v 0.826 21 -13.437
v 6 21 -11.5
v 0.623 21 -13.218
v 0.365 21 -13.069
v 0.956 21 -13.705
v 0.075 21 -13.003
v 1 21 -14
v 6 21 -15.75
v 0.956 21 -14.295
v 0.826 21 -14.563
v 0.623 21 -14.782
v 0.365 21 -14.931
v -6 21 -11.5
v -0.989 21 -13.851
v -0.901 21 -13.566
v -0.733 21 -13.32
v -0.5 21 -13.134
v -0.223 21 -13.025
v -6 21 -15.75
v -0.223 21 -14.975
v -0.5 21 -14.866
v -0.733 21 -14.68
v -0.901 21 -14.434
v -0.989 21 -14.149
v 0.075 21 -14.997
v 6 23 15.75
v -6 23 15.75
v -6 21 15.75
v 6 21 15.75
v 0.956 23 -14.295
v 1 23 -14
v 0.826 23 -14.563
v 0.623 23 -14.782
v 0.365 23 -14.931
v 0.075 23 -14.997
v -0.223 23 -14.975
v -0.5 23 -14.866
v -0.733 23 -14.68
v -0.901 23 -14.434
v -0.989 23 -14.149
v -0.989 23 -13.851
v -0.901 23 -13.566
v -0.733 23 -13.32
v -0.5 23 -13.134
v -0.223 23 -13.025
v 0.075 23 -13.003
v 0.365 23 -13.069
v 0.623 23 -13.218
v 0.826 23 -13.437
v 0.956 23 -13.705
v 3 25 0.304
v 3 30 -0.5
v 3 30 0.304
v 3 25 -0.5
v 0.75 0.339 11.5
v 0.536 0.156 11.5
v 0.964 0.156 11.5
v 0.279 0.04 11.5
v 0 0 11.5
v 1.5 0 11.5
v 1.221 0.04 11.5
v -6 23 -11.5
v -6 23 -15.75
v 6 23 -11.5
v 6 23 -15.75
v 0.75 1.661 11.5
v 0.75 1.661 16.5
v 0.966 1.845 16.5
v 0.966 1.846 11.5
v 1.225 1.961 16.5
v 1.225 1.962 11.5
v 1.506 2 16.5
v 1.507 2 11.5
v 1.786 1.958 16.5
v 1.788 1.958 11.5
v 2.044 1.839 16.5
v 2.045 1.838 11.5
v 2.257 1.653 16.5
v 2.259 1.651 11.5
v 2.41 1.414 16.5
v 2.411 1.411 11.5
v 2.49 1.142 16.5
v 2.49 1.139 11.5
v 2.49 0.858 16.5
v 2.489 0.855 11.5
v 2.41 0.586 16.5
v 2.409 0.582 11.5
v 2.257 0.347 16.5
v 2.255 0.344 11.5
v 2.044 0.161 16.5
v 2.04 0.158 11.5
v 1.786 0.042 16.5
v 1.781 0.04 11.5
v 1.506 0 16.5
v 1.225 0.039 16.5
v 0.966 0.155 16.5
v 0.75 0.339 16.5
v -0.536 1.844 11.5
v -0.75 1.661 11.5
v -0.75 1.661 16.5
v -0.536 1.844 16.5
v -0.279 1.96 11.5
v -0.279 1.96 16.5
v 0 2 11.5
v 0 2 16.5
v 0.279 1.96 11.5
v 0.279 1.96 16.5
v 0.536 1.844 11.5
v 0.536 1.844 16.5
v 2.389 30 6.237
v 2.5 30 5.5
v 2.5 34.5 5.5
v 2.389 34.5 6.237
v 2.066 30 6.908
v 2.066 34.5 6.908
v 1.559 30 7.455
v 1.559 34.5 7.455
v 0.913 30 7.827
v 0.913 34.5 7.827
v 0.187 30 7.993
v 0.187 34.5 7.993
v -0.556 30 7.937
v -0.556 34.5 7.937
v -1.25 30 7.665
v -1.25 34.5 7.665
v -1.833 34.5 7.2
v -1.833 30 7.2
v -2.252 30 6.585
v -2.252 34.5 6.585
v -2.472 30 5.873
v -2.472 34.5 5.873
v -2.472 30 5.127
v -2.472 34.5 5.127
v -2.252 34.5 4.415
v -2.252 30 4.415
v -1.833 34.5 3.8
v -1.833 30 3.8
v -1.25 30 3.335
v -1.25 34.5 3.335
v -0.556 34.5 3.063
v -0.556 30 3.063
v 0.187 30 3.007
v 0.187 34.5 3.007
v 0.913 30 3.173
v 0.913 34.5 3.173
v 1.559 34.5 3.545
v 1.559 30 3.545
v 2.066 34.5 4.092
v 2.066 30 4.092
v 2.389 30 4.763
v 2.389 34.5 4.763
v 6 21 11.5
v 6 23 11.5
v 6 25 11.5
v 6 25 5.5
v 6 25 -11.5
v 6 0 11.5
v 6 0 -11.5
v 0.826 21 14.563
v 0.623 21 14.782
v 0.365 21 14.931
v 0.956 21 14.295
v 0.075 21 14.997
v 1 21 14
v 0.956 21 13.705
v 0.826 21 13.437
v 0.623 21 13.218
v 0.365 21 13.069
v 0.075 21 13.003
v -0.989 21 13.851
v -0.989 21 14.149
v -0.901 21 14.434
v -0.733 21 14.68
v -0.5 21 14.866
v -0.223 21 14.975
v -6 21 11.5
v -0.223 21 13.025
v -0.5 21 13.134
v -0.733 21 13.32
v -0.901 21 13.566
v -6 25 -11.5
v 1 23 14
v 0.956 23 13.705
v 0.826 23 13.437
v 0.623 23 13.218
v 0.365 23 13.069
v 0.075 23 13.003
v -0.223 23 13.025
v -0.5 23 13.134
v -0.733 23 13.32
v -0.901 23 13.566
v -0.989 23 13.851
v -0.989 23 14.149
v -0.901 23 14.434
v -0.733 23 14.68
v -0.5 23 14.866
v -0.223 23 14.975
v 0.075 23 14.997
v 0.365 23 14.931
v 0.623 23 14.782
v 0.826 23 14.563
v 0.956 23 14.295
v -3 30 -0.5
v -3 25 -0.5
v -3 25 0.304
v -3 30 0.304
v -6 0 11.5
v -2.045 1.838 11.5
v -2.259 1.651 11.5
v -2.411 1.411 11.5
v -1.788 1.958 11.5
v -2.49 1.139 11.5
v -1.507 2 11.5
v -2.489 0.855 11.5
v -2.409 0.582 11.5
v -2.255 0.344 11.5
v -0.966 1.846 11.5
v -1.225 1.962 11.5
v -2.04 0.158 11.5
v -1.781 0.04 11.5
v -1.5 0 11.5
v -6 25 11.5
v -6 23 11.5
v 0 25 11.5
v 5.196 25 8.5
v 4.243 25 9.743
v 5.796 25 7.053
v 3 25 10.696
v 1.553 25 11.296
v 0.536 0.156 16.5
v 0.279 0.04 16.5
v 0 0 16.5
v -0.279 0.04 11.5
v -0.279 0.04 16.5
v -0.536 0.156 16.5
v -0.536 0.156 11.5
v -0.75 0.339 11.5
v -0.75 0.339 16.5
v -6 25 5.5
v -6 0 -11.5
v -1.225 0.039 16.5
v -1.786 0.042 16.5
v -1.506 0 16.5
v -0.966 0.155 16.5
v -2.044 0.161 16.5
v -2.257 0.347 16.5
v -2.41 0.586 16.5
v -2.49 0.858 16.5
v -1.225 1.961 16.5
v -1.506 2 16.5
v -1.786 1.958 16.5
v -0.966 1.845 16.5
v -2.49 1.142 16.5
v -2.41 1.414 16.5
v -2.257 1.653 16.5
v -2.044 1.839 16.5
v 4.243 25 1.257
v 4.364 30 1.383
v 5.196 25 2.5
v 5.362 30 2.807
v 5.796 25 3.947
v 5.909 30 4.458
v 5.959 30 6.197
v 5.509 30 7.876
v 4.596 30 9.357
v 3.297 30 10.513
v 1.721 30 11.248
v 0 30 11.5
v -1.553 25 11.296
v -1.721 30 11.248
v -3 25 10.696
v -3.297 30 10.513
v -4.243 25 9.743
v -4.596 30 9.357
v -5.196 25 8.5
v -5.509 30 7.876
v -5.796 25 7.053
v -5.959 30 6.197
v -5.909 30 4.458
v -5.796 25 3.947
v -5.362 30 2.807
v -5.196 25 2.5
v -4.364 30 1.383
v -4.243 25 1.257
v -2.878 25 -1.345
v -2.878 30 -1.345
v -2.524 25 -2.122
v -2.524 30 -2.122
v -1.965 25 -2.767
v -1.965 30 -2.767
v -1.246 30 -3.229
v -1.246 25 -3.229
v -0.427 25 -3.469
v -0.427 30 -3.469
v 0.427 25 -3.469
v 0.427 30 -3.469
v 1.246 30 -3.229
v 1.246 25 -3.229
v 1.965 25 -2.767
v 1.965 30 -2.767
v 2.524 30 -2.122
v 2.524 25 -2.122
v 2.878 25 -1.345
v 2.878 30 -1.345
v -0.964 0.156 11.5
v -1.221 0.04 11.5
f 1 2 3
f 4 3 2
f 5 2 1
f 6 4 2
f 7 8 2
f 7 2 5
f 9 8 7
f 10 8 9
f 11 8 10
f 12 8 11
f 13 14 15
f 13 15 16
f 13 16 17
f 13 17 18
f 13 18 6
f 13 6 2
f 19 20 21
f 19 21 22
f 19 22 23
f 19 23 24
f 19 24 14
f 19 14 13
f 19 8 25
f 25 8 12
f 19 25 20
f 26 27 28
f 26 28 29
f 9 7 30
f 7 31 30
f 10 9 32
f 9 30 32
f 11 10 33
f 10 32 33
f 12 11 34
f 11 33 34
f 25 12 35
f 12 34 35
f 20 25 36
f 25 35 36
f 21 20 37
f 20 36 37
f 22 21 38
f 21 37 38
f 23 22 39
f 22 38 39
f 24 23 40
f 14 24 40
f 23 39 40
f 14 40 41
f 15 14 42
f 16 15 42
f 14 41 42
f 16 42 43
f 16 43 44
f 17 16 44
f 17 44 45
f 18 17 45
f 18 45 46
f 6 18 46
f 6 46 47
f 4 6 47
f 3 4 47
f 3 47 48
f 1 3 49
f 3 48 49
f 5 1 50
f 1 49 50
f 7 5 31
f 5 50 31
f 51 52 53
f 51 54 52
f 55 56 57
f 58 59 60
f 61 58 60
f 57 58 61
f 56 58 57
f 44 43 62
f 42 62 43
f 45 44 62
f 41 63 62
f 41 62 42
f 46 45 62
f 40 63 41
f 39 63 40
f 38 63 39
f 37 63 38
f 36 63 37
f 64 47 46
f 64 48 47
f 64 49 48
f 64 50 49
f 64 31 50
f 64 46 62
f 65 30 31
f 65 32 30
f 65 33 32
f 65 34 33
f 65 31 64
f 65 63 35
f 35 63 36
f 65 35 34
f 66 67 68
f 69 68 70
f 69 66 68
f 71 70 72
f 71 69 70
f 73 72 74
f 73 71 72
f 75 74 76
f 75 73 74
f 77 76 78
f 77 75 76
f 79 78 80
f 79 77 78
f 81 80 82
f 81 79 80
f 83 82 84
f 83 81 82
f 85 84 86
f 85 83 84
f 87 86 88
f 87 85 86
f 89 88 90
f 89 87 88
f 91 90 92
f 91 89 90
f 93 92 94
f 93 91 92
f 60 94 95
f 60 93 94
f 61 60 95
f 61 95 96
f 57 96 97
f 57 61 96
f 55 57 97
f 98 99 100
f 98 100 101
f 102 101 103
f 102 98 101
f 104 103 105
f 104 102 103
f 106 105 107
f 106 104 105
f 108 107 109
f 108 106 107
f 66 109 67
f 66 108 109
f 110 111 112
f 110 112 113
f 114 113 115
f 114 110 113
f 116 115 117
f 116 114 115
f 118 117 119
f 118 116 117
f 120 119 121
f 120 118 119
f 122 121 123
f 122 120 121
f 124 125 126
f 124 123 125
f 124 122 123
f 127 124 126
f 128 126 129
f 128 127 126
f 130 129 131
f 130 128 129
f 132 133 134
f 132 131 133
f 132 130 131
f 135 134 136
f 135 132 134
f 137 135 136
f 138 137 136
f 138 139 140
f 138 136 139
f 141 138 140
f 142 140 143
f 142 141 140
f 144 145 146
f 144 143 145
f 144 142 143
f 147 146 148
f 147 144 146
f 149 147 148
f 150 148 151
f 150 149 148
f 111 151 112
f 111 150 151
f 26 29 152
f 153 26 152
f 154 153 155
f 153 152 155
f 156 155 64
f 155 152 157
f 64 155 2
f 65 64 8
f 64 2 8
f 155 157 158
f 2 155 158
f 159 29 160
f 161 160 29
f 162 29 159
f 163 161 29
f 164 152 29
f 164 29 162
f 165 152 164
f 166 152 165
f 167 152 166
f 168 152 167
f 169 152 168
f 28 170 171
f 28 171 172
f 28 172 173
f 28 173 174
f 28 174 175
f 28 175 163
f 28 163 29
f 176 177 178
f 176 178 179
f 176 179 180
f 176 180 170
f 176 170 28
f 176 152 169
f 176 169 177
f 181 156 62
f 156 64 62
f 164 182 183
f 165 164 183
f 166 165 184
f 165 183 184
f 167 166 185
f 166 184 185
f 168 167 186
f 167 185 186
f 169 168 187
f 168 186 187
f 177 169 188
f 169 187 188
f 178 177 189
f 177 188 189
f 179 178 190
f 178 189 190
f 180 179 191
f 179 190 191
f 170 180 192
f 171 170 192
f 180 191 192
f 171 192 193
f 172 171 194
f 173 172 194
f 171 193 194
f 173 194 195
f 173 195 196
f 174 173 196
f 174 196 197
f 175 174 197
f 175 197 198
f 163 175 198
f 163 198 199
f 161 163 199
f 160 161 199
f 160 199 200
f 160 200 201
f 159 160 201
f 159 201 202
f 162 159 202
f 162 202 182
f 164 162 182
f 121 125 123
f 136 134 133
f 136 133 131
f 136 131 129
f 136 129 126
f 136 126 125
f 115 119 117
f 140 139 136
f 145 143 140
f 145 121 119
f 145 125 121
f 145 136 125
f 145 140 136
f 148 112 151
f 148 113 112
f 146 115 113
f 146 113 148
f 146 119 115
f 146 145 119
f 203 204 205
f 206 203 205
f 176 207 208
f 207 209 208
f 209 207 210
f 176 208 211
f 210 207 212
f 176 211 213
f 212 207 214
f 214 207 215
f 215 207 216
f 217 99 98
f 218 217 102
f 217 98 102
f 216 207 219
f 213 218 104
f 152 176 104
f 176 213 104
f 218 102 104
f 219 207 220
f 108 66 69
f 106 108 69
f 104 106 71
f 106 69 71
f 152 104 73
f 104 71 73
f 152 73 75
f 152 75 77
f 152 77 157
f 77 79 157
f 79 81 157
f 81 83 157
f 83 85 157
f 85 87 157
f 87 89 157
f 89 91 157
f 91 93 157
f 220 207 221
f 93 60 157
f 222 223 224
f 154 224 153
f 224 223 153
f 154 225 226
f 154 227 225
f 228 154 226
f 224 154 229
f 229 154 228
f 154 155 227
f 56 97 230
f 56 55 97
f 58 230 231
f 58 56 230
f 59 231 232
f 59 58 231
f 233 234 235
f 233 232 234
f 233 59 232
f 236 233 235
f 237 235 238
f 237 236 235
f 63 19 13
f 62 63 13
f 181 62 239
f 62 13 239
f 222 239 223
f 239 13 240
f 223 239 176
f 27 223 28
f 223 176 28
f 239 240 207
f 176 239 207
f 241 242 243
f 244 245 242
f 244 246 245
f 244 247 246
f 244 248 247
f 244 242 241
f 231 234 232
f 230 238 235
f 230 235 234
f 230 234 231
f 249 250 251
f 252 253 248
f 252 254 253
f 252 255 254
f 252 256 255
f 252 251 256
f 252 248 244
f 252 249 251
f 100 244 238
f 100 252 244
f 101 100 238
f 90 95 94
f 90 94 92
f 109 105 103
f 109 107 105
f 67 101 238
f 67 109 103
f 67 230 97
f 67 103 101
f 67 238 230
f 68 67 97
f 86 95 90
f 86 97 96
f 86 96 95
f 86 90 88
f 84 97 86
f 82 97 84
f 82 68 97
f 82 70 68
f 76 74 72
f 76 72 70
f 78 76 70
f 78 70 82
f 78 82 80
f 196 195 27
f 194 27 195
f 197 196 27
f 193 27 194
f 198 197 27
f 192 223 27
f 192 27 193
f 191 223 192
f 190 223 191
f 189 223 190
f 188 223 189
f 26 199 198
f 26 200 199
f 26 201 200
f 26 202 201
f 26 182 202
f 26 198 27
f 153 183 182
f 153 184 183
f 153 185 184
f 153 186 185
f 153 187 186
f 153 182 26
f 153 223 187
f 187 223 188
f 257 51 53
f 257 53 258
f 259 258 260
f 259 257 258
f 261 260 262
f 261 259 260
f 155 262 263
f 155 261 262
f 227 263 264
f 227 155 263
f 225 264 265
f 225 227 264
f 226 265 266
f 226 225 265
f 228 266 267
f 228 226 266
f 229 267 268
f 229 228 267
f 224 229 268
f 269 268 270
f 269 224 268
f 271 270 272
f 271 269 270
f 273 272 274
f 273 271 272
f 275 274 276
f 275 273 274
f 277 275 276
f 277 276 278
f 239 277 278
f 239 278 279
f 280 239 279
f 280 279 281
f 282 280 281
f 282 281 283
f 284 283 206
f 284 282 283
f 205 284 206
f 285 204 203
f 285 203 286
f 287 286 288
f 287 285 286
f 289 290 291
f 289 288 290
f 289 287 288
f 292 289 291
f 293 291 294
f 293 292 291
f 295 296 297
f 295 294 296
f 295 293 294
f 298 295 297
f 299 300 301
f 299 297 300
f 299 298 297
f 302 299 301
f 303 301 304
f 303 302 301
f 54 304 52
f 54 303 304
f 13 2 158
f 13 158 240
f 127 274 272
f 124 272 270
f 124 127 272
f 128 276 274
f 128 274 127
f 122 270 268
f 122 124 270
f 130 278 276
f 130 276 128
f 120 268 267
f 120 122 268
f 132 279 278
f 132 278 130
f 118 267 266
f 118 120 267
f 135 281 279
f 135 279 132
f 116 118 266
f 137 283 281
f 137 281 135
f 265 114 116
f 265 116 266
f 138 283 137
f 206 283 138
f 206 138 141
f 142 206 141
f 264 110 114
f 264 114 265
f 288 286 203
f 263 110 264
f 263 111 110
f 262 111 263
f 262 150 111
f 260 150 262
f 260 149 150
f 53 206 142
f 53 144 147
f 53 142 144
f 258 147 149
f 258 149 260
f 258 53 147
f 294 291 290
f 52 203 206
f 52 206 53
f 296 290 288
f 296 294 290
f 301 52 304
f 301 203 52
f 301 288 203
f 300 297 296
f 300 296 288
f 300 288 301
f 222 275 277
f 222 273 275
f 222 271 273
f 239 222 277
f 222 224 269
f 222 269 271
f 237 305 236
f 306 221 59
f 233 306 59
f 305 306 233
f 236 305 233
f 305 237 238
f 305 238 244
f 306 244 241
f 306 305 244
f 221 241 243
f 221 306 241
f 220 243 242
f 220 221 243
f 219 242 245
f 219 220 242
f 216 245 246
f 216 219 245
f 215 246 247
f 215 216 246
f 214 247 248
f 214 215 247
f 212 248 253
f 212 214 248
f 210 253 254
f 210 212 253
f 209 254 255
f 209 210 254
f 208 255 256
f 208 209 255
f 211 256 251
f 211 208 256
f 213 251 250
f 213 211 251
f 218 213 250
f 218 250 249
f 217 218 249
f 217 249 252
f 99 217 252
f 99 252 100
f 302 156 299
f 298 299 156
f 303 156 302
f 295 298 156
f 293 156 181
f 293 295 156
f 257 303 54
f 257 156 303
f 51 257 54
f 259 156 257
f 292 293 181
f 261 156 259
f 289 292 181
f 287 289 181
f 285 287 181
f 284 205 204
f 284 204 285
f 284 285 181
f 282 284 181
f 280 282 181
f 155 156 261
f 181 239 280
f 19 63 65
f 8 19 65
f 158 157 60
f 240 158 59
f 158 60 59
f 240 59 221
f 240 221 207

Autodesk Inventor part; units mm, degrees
ref_plane "YZ Plane" through (0, 0, 0) normal (1, 0, 0) x (0, 1, 0)
sketch "Sketch1" plane through (0, 0, 0) normal (0, 1, 0) x (-1, 0, 0)
  line L0 (6, 11.5) -> (-6, 11.5)
  line L1 (-6, 11.5) -> (-6, -11.5)
  line L2 (-6, -11.5) -> (6, -11.5)
  line L3 (6, -11.5) -> (6, 11.5)
  point P0 (0, 0)
  point P1 (6, 0)
  point P2 (0, 11.5)
  dimension "d0" = 23
  dimension "d1" = 12
extrude "Extrusion1" add sketch "Sketch1" along normal blind 25
sketch "Sketch2" plane through (-6, 0, 11.5) normal (0, 0, 1) x (1, 0, 0)
  line L0 (0, 23) -> (12, 23)
  line L1 (12, 23) -> (12, 21)
  line L2 (12, 21) -> (0, 21)
  line L3 (0, 21) -> (0, 23)
  line L4 (0, 0) -> (0, 25) projected
  line L5 (12, 0) -> (12, 25) projected
  line L6 (0, 0) -> (12, 0) projected
  point P0 (6, 0)
  dimension "d4" = 2
  dimension "d5" = 21
extrude "Extrusion2" add sketch "Sketch2" along normal blind 4.25 and the other way blind 27.25 contours L0 L1 L2 L3
sketch "Sketch3" plane through (0, 25, 0) normal (0, 1, 0) x (1, 0, 0)
  circle A0 centre (0, -5.5) radius 6
  circle A1 centre (0, 0.5) radius 3
  line L0 (-6, 11.5) -> (-6, -11.5) projected
  line L1 (6, -11.5) -> (6, 11.5) projected
  line L2 (-6, -11.5) -> (6, -11.5) projected
  line L3 (-6, 3.5) -> (6, 3.5) construction
  line L4 (-3, 0.5) -> (-3, -0.3038)
  line L5 (3, 0.5) -> (3, -0.3038)
  point P0 (0, 0)
  point P1 (0, -11.5)
  dimension "d10" = 12
  dimension "d11" = 6
  dimension "d12" = 15
extrude "Extrusion3" add sketch "Sketch3" along normal blind 5 contours A0 A1 | A0 A1 L5 | A1 A0 | A0 A1 | A0 L4 A1
sketch "Sketch4" plane through (0, 30, 0) normal (0, 1, 0) x (1, 0, 0)
  circle A0 centre (0, -5.5) radius 2.5
  arc A1 (-3, -0.3038) -> (3, -0.3038) centre (0, -5.5) ccw projected
  point P0 (0, 0)
  dimension "d15" = 5
extrude "Extrusion4" add sketch "Sketch4" along normal blind 4.5
sketch "Sketch5" plane through (-6, 0, 11.5) normal (0, 0, 1) x (1, 0, 0)
  line L0 (3.5, 2) -> (8.5, 2)
  line L1 (8.5, 2) -> (8.5, 0)
  line L2 (8.5, 0) -> (3.5, 0)
  line L3 (3.5, 0) -> (3.5, 2)
  line L4 (0, 0) -> (12, 0) projected
  circle A0 centre (4.5, 1) radius 1
  circle A1 centre (7.5, 1) radius 1
  circle A2 centre (6, 1) radius 1
  point P0 (6, 0)
  point P1 (6, 0)
  point P2 (6, 0)
  point P3 (6, 0)
  dimension "d18" = 5
  dimension "d19" = 2
extrude "Extrusion5" add sketch "Sketch5" along normal blind 5 contours A0 A2 | A2 A1 A0 | A0 A2 | A1 A2 | A2 A1
ref_plane "Work Plane1" through (0, 3, 0) normal (0, -1, 0) x (1, 0, 0)
ref_plane "Work Plane2" through (0, 17, 0) normal (0, -1, 0) x (1, 0, 0)
split_face "Split1"
split_face "Split2"
sketch "Sketch6" plane through (-6, 23, 11.5) normal (0, 1, 0) x (1, 0, 0)
  circle A0 centre (6, -2.5) radius 1
  line L0 (12, -4.25) -> (0, -4.25) projected
  line L1 (0, 0) -> (12, 0) projected
  point P0 (6, 11.5)
  point P1 (6, -4.25)
  dimension "d24" = 2
  dimension "d25" = 1.5
extrude "Extrusion6" cut sketch "Sketch6" against normal up to surface (2 mm away)
sketch "Sketch7" plane through (-6, 23, -11.5) normal (0, 1, 0) x (1, 0, 0)
  circle A0 centre (6, 2.5) radius 1
  line L0 (0, 4.25) -> (12, 4.25) projected
  line L1 (12, 0) -> (0, 0) projected
  point P0 (6, -11.5)
  point P1 (6, 4.25)
  dimension "d28" = 2
  dimension "d29" = 1.5
extrude "Extrusion7" cut sketch "Sketch7" against normal up to surface (2 mm away)
equation "\"d0\" = servo_A"
equation "\"d1\" = servo_B"
equation "\"d2\" = servo_F + servo_E + servo_J"
equation "\"d4\" = servo_F"
equation "\"d5\" = servo_E"
equation "\"d6\" = -0.5 * servo_A + 0.5 * servo_D"
equation "\"d7\" = d6 + servo_A"
equation "\"d10\" = servo_B"
equation "\"d11\" = servo_N"
equation "\"d12\" = servo_I"
equation "\"d13\" = -servo_F + servo_C - servo_E - servo_J"
equation "\"d15\" = servo_G"
equation "\"d16\" = servo_O - servo_C"
equation "\"d18\" = servo_K"
equation "\"d24\" = servo_H"
equation "\"d25\" = servo_L"
equation "\"d28\" = servo_H"
equation "\"d29\" = servo_L"
equation "\"servo_A\" = 23"
equation "\"servo_B\" = 12"
equation "\"servo_C\" = 30"
equation "\"servo_D\" = 31.5"
equation "\"servo_E\" = 21"
equation "\"servo_F\" = 2"
equation "\"servo_G\" = 5"
equation "\"servo_H\" = 2"
equation "\"servo_I\" = 15"
equation "\"servo_J\" = 2"
equation "\"servo_K\" = 5"
equation "\"servo_L\" = 1.5"
equation "\"servo_M\" = 5"
equation "\"servo_N\" = 6"
equation "\"servo_O\" = 34.5"
equation "\"servo_P\" = 33"
properties part number "TP-MG92B"
